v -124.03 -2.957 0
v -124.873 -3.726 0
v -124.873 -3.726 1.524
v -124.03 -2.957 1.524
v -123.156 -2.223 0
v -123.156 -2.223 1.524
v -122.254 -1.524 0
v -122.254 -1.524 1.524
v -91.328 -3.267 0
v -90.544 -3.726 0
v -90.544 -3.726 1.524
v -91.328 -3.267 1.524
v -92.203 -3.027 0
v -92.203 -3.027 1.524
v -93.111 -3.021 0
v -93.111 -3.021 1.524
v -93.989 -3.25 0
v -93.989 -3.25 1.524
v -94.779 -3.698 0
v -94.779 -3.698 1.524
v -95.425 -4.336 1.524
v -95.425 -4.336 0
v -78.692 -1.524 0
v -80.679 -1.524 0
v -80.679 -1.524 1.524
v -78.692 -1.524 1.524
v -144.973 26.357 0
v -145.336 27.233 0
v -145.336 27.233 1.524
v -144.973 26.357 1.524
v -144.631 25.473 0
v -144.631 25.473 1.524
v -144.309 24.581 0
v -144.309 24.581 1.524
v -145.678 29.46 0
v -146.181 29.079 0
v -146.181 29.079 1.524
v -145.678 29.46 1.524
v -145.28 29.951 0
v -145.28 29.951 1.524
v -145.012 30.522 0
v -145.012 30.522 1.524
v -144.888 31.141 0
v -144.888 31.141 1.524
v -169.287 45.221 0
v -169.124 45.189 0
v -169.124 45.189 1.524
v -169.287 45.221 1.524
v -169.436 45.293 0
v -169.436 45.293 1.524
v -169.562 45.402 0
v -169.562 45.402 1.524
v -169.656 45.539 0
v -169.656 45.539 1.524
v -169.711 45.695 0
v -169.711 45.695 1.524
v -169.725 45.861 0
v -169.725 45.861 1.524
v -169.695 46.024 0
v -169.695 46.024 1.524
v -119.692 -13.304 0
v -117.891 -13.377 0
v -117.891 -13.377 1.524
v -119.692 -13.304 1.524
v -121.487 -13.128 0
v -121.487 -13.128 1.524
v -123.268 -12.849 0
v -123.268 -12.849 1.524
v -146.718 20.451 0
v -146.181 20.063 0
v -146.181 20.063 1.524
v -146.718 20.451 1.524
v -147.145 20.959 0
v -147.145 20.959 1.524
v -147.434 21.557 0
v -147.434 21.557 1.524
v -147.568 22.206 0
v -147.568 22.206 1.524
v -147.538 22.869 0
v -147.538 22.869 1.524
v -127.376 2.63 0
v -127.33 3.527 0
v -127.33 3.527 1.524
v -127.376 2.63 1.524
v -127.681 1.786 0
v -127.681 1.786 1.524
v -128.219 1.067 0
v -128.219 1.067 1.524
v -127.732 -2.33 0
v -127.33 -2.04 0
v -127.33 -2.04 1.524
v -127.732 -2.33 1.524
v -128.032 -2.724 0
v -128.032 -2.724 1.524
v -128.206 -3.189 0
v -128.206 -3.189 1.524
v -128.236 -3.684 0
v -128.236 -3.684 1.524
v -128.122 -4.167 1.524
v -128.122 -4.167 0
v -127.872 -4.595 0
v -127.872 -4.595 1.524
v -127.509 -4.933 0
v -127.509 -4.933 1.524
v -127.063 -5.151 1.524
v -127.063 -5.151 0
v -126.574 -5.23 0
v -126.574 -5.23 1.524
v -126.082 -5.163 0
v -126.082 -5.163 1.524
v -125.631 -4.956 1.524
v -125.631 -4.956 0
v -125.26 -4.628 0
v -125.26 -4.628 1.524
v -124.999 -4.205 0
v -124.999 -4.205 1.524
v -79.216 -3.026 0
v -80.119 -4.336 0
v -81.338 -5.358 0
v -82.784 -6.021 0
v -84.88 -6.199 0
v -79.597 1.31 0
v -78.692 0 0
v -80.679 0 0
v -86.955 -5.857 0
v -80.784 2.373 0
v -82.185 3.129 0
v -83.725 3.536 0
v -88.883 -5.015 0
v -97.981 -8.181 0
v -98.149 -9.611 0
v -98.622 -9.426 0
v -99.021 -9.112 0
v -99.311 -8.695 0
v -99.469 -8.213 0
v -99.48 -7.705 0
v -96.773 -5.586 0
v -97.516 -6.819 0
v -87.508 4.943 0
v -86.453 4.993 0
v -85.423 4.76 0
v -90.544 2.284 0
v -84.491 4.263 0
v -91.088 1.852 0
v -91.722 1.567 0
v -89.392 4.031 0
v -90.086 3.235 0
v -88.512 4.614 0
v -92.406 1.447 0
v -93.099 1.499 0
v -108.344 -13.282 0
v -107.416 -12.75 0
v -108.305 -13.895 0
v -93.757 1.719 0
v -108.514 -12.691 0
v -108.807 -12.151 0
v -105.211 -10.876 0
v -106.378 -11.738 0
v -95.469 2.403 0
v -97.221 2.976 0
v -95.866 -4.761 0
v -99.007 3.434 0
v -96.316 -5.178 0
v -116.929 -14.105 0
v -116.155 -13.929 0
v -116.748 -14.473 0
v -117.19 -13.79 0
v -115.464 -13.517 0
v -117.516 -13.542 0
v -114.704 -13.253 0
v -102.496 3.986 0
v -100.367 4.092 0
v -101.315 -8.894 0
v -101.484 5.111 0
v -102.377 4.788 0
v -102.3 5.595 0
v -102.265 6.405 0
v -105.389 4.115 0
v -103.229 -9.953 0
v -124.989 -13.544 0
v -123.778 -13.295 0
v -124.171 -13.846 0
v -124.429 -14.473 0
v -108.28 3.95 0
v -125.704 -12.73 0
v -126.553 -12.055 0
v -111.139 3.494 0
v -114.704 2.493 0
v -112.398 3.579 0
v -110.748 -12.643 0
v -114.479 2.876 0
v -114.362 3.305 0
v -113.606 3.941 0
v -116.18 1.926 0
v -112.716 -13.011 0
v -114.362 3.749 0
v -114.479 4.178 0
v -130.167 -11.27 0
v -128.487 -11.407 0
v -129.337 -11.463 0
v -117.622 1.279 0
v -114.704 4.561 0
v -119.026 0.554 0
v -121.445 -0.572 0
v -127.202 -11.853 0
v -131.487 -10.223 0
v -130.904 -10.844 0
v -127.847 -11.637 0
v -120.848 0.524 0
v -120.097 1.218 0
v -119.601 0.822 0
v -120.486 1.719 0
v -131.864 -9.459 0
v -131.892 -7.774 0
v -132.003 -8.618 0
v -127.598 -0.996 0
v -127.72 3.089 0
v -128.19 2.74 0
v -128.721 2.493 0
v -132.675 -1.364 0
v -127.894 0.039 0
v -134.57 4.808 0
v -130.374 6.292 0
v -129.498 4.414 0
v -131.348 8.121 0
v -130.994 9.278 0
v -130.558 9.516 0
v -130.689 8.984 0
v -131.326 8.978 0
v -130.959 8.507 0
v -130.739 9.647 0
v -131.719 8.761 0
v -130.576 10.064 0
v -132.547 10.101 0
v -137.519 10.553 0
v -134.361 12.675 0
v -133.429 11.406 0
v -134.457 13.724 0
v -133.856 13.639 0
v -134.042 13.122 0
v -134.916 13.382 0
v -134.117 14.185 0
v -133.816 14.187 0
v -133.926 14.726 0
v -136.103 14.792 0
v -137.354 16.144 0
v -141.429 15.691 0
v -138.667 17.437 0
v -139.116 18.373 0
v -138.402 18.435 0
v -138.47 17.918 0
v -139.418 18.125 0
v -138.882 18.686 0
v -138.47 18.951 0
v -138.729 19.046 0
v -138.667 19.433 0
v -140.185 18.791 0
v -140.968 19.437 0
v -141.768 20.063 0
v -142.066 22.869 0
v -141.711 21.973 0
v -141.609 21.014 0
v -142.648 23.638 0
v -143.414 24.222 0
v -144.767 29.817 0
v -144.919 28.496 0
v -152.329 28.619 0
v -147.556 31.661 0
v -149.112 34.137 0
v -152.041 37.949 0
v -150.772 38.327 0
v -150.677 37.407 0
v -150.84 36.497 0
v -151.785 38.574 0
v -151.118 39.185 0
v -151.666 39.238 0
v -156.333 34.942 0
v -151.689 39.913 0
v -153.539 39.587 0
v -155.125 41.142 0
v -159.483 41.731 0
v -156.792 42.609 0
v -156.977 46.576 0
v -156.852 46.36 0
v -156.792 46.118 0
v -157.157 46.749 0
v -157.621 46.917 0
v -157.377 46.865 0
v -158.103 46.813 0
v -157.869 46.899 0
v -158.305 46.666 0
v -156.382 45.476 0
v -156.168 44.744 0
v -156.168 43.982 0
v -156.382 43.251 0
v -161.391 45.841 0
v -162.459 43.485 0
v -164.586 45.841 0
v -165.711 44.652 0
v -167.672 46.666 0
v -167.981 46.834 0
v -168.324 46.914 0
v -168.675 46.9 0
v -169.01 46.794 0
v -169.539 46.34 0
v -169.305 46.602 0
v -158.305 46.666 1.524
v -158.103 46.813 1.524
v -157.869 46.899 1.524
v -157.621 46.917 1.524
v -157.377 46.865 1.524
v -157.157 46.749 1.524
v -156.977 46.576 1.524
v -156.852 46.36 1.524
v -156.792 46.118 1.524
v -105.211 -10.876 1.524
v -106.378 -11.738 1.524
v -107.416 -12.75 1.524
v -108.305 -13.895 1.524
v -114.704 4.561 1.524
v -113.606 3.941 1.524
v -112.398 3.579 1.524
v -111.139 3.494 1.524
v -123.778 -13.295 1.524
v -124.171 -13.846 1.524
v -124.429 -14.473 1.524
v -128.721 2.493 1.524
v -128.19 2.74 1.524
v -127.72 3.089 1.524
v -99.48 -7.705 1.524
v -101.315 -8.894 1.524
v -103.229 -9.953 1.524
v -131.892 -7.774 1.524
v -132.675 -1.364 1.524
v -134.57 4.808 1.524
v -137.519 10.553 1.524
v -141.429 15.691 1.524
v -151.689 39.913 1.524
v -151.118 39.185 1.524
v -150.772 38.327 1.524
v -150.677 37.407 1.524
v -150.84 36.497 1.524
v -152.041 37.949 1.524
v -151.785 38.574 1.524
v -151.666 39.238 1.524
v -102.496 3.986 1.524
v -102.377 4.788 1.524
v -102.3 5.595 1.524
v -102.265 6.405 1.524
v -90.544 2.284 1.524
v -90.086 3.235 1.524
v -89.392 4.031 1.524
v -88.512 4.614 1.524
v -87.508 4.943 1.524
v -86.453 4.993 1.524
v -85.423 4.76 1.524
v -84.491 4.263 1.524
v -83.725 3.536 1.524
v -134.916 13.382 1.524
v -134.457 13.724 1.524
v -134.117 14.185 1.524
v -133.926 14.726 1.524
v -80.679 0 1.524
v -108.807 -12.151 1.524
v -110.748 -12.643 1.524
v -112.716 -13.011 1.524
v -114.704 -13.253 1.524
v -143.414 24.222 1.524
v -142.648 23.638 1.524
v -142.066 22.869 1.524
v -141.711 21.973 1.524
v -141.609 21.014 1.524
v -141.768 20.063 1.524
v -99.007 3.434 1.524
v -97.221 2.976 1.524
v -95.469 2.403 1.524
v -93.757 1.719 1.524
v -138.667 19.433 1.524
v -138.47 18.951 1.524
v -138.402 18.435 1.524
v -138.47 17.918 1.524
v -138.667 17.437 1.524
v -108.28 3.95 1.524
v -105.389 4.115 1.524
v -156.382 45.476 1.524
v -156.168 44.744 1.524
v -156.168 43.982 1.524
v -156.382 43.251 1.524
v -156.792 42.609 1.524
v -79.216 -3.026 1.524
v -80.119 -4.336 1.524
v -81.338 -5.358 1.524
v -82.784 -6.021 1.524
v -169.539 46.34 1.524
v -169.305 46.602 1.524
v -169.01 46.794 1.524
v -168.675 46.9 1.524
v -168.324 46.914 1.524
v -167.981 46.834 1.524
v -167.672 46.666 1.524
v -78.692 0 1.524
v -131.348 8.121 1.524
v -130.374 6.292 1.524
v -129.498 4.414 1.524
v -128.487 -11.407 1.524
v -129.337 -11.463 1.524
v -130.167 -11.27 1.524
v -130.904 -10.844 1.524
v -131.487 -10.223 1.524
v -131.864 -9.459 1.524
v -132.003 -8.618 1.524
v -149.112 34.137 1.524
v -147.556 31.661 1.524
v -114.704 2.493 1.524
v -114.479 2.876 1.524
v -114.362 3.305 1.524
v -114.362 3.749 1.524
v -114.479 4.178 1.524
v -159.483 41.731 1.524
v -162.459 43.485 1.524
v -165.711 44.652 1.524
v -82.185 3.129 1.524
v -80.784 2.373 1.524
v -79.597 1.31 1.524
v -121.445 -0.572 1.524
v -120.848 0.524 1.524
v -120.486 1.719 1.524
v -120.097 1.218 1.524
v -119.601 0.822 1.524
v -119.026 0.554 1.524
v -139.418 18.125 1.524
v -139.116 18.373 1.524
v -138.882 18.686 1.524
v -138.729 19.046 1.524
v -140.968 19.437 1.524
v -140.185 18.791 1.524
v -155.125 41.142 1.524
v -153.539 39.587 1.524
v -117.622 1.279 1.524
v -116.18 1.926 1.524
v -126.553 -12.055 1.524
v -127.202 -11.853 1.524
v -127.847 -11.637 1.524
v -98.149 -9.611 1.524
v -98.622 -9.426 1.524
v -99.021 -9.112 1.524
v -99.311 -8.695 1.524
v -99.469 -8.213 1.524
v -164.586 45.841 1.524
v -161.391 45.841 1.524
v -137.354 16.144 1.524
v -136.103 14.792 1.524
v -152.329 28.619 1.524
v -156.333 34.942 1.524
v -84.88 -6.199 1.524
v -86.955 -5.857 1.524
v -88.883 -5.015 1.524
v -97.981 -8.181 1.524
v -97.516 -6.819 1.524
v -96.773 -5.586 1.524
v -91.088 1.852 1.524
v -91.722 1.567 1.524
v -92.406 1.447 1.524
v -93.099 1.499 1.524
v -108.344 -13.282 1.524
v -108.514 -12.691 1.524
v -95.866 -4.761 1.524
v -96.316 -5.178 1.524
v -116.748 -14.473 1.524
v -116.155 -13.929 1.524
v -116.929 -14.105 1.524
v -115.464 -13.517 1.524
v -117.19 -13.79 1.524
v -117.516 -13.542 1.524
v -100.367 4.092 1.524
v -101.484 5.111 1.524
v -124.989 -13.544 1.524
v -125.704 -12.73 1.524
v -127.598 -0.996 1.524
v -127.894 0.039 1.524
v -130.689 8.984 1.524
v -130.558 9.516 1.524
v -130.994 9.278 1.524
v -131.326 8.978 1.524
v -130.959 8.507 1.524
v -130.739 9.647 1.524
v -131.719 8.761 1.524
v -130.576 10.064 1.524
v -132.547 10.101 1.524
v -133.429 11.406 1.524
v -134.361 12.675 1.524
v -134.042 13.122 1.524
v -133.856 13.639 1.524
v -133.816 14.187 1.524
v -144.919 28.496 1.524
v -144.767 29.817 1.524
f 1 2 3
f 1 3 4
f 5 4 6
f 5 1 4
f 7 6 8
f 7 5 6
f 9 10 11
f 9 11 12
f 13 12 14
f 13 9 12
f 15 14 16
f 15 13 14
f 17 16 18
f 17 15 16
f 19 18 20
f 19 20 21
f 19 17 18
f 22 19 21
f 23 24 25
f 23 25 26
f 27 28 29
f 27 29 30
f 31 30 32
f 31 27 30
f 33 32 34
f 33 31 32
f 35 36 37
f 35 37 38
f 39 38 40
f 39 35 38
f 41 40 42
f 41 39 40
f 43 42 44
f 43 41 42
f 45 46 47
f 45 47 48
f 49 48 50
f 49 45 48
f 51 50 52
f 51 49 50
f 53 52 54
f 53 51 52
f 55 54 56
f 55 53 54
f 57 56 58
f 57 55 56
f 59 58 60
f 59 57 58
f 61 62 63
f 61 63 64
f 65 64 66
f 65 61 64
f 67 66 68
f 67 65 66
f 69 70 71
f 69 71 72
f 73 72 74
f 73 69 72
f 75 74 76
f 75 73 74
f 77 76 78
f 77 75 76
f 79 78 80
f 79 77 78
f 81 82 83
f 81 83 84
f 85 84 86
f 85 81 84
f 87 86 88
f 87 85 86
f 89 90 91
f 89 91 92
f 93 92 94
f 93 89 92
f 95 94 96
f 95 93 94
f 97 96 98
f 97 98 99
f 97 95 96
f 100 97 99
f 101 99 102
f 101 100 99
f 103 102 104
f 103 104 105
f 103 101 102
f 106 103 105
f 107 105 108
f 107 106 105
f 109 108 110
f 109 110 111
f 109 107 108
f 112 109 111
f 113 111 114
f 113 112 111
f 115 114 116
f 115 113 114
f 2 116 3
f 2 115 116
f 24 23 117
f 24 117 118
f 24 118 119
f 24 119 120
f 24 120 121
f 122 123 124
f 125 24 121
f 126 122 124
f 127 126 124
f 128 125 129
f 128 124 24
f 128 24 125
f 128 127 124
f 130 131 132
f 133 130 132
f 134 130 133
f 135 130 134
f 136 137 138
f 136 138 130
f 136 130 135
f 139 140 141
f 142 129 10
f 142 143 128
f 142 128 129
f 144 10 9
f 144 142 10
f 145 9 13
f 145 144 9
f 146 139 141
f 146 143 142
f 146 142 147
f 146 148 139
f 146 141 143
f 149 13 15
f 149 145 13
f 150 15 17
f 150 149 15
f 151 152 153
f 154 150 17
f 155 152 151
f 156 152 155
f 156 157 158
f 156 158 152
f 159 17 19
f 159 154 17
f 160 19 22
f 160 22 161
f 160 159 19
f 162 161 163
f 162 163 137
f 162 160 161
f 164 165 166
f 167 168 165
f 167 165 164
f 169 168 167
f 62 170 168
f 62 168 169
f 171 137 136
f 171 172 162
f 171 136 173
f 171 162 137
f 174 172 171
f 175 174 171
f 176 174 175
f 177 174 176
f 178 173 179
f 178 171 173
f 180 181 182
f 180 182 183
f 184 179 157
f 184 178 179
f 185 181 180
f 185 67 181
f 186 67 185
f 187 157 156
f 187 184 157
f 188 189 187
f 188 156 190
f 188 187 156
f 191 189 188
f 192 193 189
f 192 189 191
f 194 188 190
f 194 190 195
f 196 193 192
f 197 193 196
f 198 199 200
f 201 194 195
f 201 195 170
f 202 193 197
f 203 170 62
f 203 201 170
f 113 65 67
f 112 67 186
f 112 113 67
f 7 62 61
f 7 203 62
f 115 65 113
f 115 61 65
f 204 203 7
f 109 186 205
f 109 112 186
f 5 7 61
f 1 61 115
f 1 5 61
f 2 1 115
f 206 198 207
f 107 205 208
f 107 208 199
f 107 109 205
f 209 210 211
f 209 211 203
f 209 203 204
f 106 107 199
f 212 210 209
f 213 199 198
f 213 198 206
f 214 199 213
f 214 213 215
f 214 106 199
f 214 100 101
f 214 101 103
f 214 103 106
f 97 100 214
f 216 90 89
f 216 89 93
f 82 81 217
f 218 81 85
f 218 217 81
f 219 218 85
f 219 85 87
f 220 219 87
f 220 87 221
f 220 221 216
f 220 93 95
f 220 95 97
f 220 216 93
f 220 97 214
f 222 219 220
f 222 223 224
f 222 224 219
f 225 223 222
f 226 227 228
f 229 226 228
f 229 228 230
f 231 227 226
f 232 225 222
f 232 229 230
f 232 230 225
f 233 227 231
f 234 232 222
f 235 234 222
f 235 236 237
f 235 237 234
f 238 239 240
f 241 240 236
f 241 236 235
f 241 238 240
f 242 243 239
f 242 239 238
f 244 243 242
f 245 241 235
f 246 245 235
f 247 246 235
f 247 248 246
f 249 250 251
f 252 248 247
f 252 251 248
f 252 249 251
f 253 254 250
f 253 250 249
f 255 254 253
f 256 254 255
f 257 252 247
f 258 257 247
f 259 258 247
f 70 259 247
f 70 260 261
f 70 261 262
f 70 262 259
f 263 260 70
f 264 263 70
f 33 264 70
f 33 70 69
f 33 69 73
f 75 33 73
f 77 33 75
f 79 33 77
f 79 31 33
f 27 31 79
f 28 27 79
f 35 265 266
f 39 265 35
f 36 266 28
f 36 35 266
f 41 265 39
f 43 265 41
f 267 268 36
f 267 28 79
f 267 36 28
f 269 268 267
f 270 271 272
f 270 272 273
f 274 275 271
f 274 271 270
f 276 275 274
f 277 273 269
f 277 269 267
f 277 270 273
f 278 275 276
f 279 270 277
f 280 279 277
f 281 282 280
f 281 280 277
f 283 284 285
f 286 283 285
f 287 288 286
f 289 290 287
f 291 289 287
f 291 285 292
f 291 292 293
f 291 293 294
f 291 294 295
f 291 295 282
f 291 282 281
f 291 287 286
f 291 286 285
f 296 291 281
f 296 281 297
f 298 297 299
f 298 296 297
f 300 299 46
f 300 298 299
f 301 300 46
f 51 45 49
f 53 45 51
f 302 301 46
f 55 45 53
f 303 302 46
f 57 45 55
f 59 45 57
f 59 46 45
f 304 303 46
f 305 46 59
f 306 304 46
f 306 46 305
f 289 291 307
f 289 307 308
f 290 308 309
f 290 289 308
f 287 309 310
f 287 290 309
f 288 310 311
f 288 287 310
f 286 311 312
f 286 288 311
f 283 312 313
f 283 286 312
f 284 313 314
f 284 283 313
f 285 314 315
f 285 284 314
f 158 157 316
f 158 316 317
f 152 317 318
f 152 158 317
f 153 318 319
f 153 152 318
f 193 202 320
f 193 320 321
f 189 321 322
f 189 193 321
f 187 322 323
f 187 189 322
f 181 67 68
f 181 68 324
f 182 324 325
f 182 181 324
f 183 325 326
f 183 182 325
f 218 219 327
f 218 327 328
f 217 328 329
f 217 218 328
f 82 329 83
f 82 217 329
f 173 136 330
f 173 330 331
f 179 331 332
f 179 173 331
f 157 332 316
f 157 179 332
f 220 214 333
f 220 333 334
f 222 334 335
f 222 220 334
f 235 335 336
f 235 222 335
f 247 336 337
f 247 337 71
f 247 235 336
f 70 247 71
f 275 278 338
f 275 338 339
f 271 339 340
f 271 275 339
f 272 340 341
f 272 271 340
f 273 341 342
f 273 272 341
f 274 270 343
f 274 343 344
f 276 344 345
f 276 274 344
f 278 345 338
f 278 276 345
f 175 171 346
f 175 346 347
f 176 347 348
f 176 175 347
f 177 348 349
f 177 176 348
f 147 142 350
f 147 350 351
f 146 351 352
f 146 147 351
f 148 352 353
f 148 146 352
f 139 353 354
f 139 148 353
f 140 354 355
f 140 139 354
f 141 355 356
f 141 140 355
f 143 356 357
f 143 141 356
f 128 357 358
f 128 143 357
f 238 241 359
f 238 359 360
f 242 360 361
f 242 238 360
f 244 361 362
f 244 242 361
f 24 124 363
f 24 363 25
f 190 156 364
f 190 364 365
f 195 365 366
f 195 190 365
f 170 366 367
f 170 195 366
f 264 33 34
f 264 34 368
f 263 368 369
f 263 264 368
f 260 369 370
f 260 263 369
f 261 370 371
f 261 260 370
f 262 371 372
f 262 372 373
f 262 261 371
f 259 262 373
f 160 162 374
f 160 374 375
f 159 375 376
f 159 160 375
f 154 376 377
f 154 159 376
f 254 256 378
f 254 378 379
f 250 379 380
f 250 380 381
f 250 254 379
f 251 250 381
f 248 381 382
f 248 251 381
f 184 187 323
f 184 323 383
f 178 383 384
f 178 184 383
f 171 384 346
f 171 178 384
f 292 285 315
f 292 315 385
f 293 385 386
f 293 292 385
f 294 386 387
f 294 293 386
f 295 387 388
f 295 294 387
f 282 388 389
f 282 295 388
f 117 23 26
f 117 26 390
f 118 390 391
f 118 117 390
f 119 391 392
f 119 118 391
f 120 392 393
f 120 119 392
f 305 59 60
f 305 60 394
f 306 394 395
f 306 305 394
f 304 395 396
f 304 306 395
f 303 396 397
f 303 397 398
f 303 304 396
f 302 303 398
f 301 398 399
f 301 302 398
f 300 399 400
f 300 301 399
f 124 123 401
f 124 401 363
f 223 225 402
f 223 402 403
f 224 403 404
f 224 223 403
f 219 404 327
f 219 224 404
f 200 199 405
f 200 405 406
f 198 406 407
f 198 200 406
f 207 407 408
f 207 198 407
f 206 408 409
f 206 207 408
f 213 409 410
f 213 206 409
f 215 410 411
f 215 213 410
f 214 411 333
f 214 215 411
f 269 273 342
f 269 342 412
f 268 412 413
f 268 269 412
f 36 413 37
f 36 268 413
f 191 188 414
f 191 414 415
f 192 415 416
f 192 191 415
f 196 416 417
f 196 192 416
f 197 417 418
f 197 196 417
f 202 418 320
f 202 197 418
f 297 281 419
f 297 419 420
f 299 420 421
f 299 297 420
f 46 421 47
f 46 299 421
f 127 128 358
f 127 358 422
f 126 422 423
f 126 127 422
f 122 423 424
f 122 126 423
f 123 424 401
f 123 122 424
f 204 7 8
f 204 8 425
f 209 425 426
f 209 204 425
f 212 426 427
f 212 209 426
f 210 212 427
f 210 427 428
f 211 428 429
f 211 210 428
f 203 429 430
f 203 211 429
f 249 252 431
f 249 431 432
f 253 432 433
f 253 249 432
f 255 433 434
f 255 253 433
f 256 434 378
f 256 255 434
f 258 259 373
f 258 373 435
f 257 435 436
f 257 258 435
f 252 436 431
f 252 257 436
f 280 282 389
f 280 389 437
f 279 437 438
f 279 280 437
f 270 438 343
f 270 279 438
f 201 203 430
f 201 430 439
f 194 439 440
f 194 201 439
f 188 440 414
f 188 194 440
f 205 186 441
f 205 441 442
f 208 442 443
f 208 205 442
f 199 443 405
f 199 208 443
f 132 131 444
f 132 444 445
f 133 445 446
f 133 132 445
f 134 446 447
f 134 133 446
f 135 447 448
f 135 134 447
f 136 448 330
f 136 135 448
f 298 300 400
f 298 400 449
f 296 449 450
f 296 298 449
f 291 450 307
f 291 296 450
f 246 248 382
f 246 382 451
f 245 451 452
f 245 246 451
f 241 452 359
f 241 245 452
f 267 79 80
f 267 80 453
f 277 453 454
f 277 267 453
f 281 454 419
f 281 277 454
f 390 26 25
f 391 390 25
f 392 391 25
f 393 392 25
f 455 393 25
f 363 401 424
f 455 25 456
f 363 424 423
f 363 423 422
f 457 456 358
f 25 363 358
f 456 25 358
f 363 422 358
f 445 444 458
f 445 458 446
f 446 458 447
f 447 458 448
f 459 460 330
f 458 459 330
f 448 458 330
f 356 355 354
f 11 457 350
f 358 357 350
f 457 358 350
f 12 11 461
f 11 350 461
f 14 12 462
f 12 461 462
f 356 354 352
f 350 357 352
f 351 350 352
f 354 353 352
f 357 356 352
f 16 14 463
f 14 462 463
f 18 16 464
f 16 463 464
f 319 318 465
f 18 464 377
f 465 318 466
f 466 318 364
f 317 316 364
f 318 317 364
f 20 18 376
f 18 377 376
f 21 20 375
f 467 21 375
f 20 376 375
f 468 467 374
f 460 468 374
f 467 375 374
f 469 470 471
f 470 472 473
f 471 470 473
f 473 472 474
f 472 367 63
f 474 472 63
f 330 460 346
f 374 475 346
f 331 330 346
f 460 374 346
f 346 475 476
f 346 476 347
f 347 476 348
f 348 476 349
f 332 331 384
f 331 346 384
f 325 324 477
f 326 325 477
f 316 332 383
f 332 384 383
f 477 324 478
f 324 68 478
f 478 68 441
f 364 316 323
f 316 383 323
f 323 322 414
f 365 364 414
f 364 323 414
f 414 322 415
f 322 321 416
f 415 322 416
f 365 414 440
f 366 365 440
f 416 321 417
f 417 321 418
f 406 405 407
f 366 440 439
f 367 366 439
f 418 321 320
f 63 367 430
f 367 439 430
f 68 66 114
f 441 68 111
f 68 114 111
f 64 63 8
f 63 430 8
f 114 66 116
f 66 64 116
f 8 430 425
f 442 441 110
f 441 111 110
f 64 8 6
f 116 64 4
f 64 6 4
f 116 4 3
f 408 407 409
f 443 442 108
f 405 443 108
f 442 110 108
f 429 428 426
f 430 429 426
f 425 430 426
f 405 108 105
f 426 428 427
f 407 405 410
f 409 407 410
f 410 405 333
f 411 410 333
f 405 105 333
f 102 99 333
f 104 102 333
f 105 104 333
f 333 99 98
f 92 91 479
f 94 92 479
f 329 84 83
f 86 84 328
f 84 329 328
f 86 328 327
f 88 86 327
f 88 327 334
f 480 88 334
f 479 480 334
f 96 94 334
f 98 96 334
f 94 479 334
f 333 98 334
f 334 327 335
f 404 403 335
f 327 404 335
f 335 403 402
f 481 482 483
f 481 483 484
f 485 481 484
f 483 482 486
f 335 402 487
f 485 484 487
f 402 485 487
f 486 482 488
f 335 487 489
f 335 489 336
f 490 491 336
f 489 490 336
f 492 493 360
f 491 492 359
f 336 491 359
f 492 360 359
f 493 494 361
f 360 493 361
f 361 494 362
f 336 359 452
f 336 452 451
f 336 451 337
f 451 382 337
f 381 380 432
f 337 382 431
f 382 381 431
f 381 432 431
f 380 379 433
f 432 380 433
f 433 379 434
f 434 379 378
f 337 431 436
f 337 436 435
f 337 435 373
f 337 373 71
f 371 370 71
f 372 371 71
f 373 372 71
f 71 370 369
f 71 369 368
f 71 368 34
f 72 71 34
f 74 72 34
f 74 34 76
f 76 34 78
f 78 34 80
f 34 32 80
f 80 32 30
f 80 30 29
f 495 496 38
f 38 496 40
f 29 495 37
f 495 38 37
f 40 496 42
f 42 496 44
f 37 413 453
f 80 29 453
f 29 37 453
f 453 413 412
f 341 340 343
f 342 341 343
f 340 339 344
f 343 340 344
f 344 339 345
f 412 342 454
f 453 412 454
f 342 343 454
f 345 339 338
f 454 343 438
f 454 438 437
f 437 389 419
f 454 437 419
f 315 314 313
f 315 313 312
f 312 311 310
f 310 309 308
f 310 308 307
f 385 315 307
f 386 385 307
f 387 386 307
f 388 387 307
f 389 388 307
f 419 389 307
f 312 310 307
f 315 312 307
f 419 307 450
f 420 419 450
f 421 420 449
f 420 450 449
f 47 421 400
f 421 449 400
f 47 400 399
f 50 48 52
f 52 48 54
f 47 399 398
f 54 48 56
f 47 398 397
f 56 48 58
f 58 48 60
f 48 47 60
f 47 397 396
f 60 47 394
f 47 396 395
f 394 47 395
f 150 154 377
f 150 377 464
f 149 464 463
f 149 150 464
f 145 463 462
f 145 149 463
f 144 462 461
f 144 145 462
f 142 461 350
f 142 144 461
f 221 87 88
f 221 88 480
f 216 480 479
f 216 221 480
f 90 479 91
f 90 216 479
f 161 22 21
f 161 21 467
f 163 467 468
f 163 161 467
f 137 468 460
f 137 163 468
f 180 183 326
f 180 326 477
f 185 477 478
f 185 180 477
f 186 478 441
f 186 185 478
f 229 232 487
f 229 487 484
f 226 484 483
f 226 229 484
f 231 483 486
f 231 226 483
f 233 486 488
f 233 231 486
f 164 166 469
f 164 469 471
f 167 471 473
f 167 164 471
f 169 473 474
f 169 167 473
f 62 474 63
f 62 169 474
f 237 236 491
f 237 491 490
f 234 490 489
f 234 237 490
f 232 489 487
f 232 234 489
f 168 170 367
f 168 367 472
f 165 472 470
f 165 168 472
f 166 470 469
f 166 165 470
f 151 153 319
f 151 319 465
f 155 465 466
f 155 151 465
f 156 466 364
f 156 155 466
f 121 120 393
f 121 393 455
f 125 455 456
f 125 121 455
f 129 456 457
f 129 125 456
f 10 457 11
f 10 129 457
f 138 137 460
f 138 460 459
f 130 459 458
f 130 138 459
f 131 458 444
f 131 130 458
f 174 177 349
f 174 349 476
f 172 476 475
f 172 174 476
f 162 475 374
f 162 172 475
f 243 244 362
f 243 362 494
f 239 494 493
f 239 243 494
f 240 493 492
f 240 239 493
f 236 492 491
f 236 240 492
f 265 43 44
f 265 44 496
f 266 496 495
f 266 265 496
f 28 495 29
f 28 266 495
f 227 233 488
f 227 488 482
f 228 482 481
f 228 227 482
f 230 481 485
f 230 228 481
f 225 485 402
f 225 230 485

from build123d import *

# Parameters (mm, degrees)
BOSS_EXTRUDE1_DEPTH = 1.524


with BuildPart() as part:
    # Sketch1 → Boss-Extrude1 (new body)
    with BuildSketch(Plane.XY):
        with BuildLine():
            Line((-80.678958716, -0.762), (-80.678958716, -1.524))
            Line((-80.678958716, -1.524), (-78.692395213, -1.524))
            ThreePointArc((-78.692395213, -1.524), (-80.119170164, -4.335621645), (-82.784103237, -6.02056519))
            ThreePointArc((-82.784103237, -6.02056519), (-86.955126255, -5.857190971), (-90.544084344, -3.725641304))
            ThreePointArc((-90.544084344, -3.725641304), (-93.110836317, -3.021062409), (-95.425262377, -4.335626641))
            ThreePointArc((-95.425262377, -4.335626641), (-96.090143572, -4.970756046), (-96.773276943, -5.586211293))
            ThreePointArc((-96.773276943, -5.586211293), (-97.784617842, -7.488047423), (-98.148581764, -9.611092724))
            ThreePointArc((-98.148581764, -9.611092724), (-99.181314776, -8.914327019), (-99.479737369, -7.704796582))
            ThreePointArc((-99.479737369, -7.704796582), (-102.262807493, -9.439979809), (-105.21119287, -10.876421181))
            ThreePointArc((-105.21119287, -10.876421181), (-106.91403356, -12.226062588), (-108.305450104, -13.894941956))
            ThreePointArc((-108.305450104, -13.894941956), (-108.413080528, -12.98188304), (-108.807060537, -12.151196188))
            ThreePointArc((-108.807060537, -12.151196188), (-111.729155507, -12.842858899), (-114.703828793, -13.253169951))
            ThreePointArc((-114.703828793, -13.253169951), (-115.819933123, -13.705232404), (-116.747990814, -14.472538249))
            ThreePointArc((-116.747990814, -14.472538249), (-117.190021542, -13.789583851), (-117.891000612, -13.376732524))
            ThreePointArc((-117.891000612, -13.376732524), (-120.590758029, -13.228581749), (-123.267868738, -12.849481471))
            ThreePointArc((-123.267868738, -12.849481471), (-123.990419129, -13.559319569), (-124.428575307, -14.472538249))
            ThreePointArc((-124.428575307, -14.472538249), (-125.32839078, -13.121289449), (-126.552690184, -12.05515992))
            ThreePointArc((-126.552690184, -12.05515992), (-127.525021572, -11.746786856), (-128.486859712, -11.407096306))
            ThreePointArc((-128.486859712, -11.407096306), (-131.218641373, -10.554840596), (-131.89233577, -7.773634616))
            ThreePointArc((-131.89233577, -7.773634616), (-135.917529766, 7.745683618), (-146.180659468, 20.063134404))
            ThreePointArc((-146.180659468, 20.063134404), (-147.307798591, 21.249069948), (-147.538428831, 22.868852467))
            ThreePointArc((-147.538428831, 22.868852467), (-154.433810452, 31.715414423), (-159.483026723, 41.731070227))
            ThreePointArc((-159.483026723, 41.731070227), (-164.057778752, 44.14499505), (-169.123893732, 45.188962572))
            ThreePointArc((-169.123893732, 45.188962572), (-169.613633215, 45.467140142), (-169.695148012, 46.024439755))
            ThreePointArc((-169.695148012, 46.024439755), (-168.84624225, 46.858034119), (-167.67211669, 46.665811009))
            ThreePointArc((-167.67211669, 46.665811009), (-162.988364111, 45.736856959), (-158.304611532, 46.665811009))
            ThreePointArc((-158.304611532, 46.665811009), (-157.376988383, 46.865370886), (-156.791979775, 46.118327526))
            ThreePointArc((-156.791979775, 46.118327526), (-156.141187023, 44.363429515), (-156.791979775, 42.608531504))
            ThreePointArc((-156.791979775, 42.608531504), (-154.321595691, 40.375345287), (-152.040654012, 37.948985202))
            ThreePointArc((-152.040654012, 37.948985202), (-151.707852276, 38.902874077), (-151.688853759, 39.9129731))
            ThreePointArc((-151.688853759, 39.9129731), (-150.771869741, 38.327385628), (-150.840091724, 36.497005044))
            ThreePointArc((-150.840091724, 36.497005044), (-148.311639905, 32.912883943), (-146.180659468, 29.07909795))
            ThreePointArc((-146.180659468, 29.07909795), (-145.280256751, 29.950524174), (-144.888474533, 31.140740714))
            ThreePointArc((-144.888474533, 31.140740714), (-144.809080792, 29.152180218), (-145.336243225, 27.233124206))
            ThreePointArc((-145.336243225, 27.233124206), (-144.799576526, 25.915962426), (-144.308931698, 24.580974055))
            ThreePointArc((-144.308931698, 24.580974055), (-142.066206257, 22.868864738), (-141.767740402, 20.063146675))
            ThreePointArc((-141.767740402, 20.063146675), (-140.574422381, 19.11655359), (-139.418496756, 18.124645168))
            ThreePointArc((-139.418496756, 18.124645168), (-138.882087848, 18.686270696), (-138.666940721, 19.432507564))
            ThreePointArc((-138.666940721, 19.432507564), (-138.402251182, 18.434511119), (-138.666940721, 17.436514673))
            ThreePointArc((-138.666940721, 17.436514673), (-136.72060571, 15.475055994), (-134.91620317, 13.382289501))
            ThreePointArc((-134.91620317, 13.382289501), (-134.269462496, 13.942240539), (-133.926062208, 14.725754998))
            ThreePointArc((-133.926062208, 14.725754998), (-133.856105481, 13.639249521), (-134.361203786, 12.674747683))
            ThreePointArc((-134.361203786, 12.674747683), (-132.981359798, 10.757644416), (-131.718603375, 8.761472935))
            ThreePointArc((-131.718603375, 8.761472935), (-130.994013595, 9.278385285), (-130.576166715, 10.064281405))
            ThreePointArc((-130.576166715, 10.064281405), (-130.688633828, 8.984081435), (-131.3478244, 8.120977377))
            ThreePointArc((-131.3478244, 8.120977377), (-129.923570985, 5.358468693), (-128.720985312, 2.492506426))
            ThreePointArc((-128.720985312, 2.492506426), (-127.945801885, 2.902637911), (-127.329634113, 3.526700773))
            ThreePointArc((-127.329634113, 3.526700773), (-127.497659552, 2.19677598), (-128.218534166, 1.066611259))
            ThreePointArc((-128.218534166, 1.066611259), (-127.742305365, -0.477350315), (-127.329634113, -2.039500643))
            ThreePointArc((-127.329634113, -2.039500643), (-127.508941307, -4.933154821), (-124.873174428, -3.725629032))
            ThreePointArc((-124.873174428, -3.725629032), (-123.596637716, -2.585576016), (-122.254131396, -1.524))
            ThreePointArc((-122.254131396, -1.524), (-121.118350406, -0.039599921), (-120.48608758, 1.71928773))
            ThreePointArc((-120.48608758, 1.71928773), (-119.861122825, 1.004984574), (-119.026219436, 0.55360195))
            ThreePointArc((-119.026219436, 0.55360195), (-116.905277713, 1.612791346), (-114.703828793, 2.492506426))
            ThreePointArc((-114.703828793, 2.492506426), (-114.347417181, 3.526700773), (-114.703828793, 4.560895121))
            ThreePointArc((-114.703828793, 4.560895121), (-113.011657325, 3.726445198), (-111.139333293, 3.493735784))
            ThreePointArc((-111.139333293, 3.493735784), (-106.83626692, 4.069231273), (-102.495682566, 3.986148614))
            ThreePointArc((-102.495682566, 3.986148614), (-102.332792834, 5.191235076), (-102.264713723, 6.405373321))
            ThreePointArc((-102.264713723, 6.405373321), (-100.962727059, 4.560895121), (-99.006554721, 3.433660057))
            ThreePointArc((-99.006554721, 3.433660057), (-96.34050231, 2.703577616), (-93.757475163, 1.71928773))
            ThreePointArc((-93.757475163, 1.71928773), (-92.060227448, 1.486006715), (-90.544083581, 2.283739511))
            ThreePointArc((-90.544083581, 2.283739511), (-87.507868111, 4.942615236), (-83.724934757, 3.536329442))
            ThreePointArc((-83.724934757, 3.536329442), (-80.783552437, 2.373141079), (-78.692395213, 0))
            Line((-78.692395213, 0), (-80.678958716, 0))
            Line((-80.678958716, 0), (-80.678958716, -0.762))
        make_face()
    extrude(amount=BOSS_EXTRUDE1_DEPTH)


solid = part.part
